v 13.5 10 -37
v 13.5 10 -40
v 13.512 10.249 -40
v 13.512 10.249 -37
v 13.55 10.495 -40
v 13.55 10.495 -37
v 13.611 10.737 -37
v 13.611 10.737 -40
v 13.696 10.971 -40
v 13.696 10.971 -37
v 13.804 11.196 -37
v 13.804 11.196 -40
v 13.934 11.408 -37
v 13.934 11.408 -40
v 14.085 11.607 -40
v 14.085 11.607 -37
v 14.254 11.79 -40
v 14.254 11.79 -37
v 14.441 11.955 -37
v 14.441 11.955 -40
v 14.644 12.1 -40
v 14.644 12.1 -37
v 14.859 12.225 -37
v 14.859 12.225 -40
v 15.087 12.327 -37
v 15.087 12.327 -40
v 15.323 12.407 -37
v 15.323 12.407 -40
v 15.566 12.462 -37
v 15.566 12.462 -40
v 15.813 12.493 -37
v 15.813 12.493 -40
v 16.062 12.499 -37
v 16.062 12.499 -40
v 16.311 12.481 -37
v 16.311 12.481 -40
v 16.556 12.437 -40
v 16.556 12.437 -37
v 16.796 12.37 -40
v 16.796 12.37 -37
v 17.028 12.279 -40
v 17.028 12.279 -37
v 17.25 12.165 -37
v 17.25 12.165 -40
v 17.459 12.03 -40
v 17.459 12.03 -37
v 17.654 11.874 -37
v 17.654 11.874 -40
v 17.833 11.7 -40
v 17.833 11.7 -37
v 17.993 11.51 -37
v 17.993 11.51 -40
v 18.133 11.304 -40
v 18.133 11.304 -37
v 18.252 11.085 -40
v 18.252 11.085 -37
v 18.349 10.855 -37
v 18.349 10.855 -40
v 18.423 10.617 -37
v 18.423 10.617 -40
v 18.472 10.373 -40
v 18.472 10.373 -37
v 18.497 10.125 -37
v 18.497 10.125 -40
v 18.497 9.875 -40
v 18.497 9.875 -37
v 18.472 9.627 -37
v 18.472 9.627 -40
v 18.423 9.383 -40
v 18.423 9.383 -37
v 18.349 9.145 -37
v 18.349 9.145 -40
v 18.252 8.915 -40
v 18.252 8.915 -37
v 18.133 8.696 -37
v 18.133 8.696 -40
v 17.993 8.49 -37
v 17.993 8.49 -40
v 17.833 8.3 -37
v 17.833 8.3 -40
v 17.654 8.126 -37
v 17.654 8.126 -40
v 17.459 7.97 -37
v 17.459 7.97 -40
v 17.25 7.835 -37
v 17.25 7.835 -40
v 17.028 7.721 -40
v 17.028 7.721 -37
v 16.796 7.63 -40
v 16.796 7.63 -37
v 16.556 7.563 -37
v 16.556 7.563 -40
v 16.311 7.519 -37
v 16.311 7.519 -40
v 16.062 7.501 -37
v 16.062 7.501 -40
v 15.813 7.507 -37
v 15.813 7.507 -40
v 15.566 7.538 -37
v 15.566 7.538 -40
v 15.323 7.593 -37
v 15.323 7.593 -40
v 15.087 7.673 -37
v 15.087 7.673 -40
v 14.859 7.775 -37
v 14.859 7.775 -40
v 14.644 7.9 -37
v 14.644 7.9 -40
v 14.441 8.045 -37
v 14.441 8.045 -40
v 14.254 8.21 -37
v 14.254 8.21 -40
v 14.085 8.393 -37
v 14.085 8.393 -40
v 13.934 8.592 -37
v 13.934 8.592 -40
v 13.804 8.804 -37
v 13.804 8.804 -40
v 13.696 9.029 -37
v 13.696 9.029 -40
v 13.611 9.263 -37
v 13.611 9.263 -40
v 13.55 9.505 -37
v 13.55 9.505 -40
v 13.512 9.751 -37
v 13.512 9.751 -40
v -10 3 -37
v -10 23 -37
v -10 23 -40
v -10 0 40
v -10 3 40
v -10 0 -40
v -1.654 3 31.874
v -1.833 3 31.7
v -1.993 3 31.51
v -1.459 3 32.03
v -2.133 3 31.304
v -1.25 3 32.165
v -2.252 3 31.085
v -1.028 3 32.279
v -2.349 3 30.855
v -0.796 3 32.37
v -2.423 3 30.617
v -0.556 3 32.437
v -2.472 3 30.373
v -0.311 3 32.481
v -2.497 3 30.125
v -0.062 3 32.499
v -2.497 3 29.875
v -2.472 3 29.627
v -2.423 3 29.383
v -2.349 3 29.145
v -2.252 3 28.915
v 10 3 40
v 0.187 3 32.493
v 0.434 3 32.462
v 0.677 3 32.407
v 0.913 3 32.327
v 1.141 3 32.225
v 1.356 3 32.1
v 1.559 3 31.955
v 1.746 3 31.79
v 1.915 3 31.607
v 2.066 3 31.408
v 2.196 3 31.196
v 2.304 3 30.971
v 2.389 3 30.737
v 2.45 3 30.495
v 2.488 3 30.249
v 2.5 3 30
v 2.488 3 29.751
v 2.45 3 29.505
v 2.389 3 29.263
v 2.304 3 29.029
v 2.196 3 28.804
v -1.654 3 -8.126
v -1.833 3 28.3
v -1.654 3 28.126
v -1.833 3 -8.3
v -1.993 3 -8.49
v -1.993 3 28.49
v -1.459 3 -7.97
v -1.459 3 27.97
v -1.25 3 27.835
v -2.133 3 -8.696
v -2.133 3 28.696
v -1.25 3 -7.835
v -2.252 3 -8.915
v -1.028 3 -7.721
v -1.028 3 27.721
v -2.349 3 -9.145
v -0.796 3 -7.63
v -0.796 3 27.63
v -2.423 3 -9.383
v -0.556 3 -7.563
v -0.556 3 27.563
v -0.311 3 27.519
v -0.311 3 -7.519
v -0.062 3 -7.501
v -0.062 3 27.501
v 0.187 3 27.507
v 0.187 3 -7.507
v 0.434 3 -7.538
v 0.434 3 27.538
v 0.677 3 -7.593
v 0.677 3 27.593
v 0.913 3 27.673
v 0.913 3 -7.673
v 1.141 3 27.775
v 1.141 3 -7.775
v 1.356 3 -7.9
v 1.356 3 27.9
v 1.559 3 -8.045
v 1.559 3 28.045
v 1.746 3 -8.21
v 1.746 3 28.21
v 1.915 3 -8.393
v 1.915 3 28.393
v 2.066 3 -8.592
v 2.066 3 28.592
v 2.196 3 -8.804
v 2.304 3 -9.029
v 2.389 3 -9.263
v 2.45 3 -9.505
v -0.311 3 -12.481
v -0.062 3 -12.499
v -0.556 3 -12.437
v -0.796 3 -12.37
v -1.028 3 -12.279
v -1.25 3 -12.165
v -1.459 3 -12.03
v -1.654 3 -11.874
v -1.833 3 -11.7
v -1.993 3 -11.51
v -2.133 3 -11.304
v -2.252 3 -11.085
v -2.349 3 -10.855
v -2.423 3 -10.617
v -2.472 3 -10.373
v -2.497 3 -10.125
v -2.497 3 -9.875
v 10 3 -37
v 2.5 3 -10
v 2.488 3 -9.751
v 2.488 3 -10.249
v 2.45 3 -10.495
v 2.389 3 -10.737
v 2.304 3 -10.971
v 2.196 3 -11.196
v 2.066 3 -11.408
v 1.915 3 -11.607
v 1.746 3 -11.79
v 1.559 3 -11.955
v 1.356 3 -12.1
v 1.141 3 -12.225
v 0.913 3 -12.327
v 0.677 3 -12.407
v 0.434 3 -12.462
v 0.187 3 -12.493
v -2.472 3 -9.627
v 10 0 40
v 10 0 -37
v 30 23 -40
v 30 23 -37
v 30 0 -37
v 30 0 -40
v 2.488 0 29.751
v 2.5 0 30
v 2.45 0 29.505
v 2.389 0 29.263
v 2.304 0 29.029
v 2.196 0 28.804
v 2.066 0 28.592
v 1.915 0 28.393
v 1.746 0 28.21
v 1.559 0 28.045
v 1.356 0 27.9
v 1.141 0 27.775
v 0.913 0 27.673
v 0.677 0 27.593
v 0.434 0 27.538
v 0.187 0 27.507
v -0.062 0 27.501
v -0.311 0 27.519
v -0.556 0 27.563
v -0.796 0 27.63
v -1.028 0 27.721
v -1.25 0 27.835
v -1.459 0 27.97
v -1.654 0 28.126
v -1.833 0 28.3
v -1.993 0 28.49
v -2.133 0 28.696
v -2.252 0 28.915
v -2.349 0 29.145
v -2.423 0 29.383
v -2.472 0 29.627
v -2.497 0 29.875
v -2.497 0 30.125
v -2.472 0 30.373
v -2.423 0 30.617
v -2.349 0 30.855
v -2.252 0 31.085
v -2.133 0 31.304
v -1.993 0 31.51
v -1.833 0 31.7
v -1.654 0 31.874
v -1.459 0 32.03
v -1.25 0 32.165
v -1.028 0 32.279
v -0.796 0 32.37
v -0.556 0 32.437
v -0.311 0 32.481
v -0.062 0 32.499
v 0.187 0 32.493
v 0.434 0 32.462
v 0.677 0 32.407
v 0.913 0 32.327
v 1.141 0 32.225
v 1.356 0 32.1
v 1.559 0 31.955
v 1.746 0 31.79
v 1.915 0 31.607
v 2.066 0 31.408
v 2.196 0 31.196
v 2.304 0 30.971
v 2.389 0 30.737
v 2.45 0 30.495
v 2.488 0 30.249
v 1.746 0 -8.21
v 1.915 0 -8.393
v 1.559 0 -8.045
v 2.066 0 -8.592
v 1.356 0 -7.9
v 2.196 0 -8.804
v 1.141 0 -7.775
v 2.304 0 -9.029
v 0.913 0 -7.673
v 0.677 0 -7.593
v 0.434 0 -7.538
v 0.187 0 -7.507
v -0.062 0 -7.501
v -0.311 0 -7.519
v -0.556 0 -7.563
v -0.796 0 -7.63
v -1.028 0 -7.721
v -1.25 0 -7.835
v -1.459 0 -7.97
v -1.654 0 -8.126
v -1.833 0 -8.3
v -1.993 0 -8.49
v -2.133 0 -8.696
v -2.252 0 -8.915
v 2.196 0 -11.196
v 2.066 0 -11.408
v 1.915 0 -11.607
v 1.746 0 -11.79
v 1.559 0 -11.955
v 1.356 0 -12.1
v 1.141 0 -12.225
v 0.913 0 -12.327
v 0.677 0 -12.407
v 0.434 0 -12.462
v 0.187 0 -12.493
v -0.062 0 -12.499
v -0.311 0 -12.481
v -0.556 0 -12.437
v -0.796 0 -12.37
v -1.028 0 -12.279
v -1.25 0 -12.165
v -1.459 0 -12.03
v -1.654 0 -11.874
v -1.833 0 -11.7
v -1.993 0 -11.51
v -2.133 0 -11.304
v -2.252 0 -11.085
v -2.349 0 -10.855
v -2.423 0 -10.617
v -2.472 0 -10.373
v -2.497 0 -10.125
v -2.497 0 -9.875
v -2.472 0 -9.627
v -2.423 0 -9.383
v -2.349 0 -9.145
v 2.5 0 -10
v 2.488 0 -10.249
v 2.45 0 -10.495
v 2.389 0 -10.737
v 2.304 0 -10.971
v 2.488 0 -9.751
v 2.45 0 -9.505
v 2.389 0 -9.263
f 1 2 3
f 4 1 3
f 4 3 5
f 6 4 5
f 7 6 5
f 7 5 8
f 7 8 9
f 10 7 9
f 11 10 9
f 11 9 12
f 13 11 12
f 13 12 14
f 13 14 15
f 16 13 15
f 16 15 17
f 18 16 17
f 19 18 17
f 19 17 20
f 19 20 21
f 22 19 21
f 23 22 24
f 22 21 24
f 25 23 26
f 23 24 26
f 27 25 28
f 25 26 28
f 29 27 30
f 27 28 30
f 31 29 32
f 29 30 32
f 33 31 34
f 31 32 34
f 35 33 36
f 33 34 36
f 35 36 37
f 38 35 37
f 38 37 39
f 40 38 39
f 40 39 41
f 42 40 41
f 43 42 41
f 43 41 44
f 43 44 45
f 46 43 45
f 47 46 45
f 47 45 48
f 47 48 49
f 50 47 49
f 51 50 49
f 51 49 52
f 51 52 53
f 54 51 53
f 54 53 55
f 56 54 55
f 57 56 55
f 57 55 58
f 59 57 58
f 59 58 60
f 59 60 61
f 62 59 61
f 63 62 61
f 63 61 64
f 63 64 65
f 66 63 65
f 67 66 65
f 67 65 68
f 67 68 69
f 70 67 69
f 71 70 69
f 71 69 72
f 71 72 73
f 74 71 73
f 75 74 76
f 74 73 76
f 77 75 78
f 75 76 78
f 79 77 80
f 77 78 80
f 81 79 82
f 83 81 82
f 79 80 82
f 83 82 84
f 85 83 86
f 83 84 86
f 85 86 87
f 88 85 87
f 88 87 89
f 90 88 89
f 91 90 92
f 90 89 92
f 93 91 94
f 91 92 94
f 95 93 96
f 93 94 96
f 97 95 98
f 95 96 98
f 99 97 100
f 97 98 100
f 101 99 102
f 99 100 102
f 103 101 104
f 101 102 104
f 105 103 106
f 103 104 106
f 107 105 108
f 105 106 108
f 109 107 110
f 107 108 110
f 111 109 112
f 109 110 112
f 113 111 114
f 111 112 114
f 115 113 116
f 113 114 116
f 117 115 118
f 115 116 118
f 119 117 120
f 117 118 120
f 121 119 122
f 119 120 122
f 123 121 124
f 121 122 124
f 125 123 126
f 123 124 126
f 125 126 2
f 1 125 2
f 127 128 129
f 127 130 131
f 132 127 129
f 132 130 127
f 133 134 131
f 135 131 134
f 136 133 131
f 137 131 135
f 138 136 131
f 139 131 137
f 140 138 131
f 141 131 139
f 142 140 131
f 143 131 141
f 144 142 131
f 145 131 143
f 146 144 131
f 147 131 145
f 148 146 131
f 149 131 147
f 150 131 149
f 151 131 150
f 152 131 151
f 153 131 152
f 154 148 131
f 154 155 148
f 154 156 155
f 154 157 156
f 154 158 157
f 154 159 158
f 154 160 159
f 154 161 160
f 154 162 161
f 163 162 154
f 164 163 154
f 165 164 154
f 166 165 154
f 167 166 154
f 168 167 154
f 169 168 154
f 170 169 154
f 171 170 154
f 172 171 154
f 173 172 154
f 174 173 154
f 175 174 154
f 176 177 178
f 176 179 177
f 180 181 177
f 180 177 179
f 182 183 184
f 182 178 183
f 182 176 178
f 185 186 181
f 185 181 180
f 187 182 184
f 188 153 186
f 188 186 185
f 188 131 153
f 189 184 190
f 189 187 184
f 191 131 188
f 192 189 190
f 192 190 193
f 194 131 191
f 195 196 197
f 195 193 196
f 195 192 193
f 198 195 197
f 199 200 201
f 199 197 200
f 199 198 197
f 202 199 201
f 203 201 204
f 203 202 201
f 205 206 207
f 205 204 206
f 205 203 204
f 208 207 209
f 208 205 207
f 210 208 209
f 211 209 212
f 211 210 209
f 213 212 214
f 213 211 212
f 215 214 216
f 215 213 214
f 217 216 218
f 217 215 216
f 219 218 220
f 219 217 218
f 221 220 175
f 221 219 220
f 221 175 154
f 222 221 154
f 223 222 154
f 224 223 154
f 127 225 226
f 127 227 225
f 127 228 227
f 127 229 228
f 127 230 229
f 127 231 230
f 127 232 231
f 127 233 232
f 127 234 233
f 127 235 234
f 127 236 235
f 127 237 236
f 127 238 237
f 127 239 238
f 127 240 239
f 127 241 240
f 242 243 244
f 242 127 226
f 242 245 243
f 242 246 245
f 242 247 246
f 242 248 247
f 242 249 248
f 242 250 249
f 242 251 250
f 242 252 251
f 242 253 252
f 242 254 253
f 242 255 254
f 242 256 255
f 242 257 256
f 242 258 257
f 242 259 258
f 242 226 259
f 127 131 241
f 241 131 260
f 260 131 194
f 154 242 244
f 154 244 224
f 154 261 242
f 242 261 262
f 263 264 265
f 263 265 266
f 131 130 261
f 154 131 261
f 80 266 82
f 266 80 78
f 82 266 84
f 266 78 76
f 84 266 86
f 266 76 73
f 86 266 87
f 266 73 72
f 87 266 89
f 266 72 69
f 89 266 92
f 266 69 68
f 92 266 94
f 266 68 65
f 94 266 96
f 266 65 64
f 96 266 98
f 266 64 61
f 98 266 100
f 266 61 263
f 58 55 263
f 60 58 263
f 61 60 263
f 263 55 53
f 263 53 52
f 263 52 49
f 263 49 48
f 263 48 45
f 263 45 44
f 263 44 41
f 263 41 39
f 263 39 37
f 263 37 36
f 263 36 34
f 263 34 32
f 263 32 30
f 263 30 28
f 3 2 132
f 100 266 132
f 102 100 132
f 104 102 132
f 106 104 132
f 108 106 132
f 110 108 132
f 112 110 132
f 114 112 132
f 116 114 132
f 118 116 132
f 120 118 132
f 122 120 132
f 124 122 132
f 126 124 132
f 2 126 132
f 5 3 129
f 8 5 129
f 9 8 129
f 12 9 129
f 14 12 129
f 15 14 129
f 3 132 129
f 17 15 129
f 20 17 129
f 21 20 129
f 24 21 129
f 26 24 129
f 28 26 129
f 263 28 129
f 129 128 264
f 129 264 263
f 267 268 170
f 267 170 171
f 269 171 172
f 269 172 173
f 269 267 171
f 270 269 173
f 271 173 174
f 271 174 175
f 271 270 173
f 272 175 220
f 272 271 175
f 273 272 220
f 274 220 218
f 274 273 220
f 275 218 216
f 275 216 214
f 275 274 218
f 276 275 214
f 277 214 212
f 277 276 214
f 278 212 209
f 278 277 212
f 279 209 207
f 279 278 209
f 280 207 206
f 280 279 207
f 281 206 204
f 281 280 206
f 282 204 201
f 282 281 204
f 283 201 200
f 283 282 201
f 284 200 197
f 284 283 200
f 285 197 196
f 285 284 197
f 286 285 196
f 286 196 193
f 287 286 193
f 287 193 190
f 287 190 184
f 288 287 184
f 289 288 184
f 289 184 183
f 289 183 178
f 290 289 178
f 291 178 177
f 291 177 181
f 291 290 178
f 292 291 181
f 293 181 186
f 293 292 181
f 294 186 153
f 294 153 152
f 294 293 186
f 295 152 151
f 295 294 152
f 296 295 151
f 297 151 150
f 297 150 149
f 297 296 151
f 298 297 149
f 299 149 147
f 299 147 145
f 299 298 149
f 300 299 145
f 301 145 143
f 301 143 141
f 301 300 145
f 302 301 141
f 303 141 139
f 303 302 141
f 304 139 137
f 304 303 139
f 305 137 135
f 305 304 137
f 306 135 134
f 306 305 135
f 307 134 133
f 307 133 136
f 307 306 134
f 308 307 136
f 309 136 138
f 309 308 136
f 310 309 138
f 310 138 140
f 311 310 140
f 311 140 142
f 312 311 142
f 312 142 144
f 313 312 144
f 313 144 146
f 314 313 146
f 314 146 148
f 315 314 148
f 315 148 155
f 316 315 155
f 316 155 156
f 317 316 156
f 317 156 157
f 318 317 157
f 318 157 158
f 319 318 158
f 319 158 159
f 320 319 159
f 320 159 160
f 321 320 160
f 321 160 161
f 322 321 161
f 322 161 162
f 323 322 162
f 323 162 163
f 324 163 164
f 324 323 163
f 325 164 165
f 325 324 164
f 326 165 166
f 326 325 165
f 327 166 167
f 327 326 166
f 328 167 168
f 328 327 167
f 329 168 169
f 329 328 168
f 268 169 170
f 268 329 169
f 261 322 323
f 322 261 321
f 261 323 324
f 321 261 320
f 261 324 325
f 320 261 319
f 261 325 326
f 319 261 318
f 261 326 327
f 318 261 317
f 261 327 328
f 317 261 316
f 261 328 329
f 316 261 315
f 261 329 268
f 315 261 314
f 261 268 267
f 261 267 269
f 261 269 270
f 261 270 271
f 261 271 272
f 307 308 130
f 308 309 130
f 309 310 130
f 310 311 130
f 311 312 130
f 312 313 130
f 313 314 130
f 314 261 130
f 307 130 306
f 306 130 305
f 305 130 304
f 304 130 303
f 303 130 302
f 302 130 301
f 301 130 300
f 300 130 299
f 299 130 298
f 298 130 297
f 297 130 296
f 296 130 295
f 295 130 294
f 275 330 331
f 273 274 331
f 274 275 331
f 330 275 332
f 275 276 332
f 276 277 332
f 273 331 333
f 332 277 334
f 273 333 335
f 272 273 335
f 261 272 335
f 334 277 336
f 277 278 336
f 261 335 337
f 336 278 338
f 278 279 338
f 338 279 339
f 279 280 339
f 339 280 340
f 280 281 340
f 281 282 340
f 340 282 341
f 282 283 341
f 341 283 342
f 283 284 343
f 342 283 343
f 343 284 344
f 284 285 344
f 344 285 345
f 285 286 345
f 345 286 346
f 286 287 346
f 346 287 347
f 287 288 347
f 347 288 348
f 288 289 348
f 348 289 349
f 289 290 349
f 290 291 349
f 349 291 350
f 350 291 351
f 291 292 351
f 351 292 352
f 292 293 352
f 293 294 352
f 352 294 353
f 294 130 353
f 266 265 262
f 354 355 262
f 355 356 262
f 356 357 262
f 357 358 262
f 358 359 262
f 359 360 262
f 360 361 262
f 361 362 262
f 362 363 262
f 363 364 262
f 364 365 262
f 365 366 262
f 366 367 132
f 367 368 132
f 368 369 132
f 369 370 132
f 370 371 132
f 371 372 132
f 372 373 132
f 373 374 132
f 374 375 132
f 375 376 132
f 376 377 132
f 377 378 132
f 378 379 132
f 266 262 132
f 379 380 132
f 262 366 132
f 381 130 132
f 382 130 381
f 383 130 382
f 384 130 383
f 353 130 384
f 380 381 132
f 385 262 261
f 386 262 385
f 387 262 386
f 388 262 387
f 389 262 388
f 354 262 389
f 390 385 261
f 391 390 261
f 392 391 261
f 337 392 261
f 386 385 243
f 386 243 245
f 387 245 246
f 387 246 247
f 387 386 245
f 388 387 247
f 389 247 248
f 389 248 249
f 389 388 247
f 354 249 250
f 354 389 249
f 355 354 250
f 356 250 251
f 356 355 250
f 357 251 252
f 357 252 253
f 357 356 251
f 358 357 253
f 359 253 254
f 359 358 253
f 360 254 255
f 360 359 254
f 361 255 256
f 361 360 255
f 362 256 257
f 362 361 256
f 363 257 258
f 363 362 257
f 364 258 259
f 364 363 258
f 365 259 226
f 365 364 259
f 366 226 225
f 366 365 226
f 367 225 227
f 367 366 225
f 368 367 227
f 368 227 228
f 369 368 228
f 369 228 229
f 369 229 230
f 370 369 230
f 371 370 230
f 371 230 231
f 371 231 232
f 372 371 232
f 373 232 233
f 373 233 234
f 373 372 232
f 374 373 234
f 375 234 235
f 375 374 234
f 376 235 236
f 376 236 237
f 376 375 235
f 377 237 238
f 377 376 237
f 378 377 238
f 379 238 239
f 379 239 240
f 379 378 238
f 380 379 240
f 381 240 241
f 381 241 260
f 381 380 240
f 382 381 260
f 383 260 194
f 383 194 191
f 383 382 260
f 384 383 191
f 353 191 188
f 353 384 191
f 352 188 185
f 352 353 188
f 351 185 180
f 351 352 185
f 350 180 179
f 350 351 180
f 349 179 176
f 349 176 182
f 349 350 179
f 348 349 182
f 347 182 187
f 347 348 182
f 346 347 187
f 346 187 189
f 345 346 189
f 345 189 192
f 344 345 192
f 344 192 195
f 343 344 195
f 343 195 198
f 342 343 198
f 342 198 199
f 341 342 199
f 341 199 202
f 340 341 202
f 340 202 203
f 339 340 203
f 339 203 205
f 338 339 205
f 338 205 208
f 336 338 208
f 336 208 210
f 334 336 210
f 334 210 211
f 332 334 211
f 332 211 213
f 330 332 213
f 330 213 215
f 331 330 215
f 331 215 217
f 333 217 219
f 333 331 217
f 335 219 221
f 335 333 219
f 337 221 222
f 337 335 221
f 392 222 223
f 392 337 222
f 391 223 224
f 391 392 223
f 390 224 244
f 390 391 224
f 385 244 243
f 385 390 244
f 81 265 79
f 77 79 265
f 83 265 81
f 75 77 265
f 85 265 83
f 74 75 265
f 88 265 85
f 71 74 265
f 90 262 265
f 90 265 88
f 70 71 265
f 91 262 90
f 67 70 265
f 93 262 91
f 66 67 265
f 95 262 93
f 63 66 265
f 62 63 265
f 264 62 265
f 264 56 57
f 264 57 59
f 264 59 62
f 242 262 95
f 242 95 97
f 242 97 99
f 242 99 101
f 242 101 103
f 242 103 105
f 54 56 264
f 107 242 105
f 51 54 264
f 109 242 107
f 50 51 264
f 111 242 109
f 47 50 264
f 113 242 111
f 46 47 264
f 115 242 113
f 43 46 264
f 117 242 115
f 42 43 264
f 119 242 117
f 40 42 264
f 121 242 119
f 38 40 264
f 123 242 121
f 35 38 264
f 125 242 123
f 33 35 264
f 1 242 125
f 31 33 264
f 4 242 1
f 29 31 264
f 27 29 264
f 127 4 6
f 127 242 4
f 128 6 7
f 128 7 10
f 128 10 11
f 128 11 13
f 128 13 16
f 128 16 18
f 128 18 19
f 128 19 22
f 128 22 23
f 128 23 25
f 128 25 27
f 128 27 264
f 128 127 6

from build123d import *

# Parameters (mm, degrees)
SKETCH1_W           = 20
SKETCH1_H           = 80
SKETCH1_R           = 2.5
BOSS_EXTRUDE1_DEPTH = 3
SKETCH2_W           = 20
SKETCH2_H           = 3
BOSS_EXTRUDE2_DEPTH = 20
SKETCH8_W           = 3
SKETCH8_H           = 23
BOSS_EXTRUDE5_DEPTH = 20
SKETCH9_R           = 2.5
CUT_EXTRUDE3_DEPTH  = 20


with BuildPart() as part:
    # Sketch1 → Boss-Extrude1 (new body)
    with BuildSketch(Plane(origin=(0, 0, 0), x_dir=(1, 0, 0), z_dir=(0, 1, 0))):
        Rectangle(SKETCH1_W, SKETCH1_H)
        with Locations((0, -30)):
            Circle(SKETCH1_R, mode=Mode.SUBTRACT)
        with Locations((0, 10)):
            Circle(SKETCH1_R, mode=Mode.SUBTRACT)
    extrude(amount=BOSS_EXTRUDE1_DEPTH)

    # Sketch2 → Boss-Extrude2 (add)
    with BuildSketch(Plane(origin=(0, 3, 0), x_dir=(1, 0, 0), z_dir=(0, 1, 0))):
        with Locations((0, 38.5)):
            Rectangle(SKETCH2_W, SKETCH2_H)
    extrude(amount=BOSS_EXTRUDE2_DEPTH)

    # Sketch8 → Boss-Extrude5 (add)
    with BuildSketch(Plane(origin=(10, 0, 0), x_dir=(0, 0, -1), z_dir=(1, 0, 0))):
        with Locations((38.5, 11.5)):
            Rectangle(SKETCH8_W, SKETCH8_H)
    extrude(amount=BOSS_EXTRUDE5_DEPTH)

    # Sketch9 → Cut-Extrude3 (cut)
    with BuildSketch(Plane(origin=(0, 0, -40), x_dir=(-1, 0, 0), z_dir=(0, 0, -1))):
        with Locations((-16, 10)):
            Circle(SKETCH9_R)
    extrude(amount=-CUT_EXTRUDE3_DEPTH, mode=Mode.SUBTRACT)


solid = part.part
